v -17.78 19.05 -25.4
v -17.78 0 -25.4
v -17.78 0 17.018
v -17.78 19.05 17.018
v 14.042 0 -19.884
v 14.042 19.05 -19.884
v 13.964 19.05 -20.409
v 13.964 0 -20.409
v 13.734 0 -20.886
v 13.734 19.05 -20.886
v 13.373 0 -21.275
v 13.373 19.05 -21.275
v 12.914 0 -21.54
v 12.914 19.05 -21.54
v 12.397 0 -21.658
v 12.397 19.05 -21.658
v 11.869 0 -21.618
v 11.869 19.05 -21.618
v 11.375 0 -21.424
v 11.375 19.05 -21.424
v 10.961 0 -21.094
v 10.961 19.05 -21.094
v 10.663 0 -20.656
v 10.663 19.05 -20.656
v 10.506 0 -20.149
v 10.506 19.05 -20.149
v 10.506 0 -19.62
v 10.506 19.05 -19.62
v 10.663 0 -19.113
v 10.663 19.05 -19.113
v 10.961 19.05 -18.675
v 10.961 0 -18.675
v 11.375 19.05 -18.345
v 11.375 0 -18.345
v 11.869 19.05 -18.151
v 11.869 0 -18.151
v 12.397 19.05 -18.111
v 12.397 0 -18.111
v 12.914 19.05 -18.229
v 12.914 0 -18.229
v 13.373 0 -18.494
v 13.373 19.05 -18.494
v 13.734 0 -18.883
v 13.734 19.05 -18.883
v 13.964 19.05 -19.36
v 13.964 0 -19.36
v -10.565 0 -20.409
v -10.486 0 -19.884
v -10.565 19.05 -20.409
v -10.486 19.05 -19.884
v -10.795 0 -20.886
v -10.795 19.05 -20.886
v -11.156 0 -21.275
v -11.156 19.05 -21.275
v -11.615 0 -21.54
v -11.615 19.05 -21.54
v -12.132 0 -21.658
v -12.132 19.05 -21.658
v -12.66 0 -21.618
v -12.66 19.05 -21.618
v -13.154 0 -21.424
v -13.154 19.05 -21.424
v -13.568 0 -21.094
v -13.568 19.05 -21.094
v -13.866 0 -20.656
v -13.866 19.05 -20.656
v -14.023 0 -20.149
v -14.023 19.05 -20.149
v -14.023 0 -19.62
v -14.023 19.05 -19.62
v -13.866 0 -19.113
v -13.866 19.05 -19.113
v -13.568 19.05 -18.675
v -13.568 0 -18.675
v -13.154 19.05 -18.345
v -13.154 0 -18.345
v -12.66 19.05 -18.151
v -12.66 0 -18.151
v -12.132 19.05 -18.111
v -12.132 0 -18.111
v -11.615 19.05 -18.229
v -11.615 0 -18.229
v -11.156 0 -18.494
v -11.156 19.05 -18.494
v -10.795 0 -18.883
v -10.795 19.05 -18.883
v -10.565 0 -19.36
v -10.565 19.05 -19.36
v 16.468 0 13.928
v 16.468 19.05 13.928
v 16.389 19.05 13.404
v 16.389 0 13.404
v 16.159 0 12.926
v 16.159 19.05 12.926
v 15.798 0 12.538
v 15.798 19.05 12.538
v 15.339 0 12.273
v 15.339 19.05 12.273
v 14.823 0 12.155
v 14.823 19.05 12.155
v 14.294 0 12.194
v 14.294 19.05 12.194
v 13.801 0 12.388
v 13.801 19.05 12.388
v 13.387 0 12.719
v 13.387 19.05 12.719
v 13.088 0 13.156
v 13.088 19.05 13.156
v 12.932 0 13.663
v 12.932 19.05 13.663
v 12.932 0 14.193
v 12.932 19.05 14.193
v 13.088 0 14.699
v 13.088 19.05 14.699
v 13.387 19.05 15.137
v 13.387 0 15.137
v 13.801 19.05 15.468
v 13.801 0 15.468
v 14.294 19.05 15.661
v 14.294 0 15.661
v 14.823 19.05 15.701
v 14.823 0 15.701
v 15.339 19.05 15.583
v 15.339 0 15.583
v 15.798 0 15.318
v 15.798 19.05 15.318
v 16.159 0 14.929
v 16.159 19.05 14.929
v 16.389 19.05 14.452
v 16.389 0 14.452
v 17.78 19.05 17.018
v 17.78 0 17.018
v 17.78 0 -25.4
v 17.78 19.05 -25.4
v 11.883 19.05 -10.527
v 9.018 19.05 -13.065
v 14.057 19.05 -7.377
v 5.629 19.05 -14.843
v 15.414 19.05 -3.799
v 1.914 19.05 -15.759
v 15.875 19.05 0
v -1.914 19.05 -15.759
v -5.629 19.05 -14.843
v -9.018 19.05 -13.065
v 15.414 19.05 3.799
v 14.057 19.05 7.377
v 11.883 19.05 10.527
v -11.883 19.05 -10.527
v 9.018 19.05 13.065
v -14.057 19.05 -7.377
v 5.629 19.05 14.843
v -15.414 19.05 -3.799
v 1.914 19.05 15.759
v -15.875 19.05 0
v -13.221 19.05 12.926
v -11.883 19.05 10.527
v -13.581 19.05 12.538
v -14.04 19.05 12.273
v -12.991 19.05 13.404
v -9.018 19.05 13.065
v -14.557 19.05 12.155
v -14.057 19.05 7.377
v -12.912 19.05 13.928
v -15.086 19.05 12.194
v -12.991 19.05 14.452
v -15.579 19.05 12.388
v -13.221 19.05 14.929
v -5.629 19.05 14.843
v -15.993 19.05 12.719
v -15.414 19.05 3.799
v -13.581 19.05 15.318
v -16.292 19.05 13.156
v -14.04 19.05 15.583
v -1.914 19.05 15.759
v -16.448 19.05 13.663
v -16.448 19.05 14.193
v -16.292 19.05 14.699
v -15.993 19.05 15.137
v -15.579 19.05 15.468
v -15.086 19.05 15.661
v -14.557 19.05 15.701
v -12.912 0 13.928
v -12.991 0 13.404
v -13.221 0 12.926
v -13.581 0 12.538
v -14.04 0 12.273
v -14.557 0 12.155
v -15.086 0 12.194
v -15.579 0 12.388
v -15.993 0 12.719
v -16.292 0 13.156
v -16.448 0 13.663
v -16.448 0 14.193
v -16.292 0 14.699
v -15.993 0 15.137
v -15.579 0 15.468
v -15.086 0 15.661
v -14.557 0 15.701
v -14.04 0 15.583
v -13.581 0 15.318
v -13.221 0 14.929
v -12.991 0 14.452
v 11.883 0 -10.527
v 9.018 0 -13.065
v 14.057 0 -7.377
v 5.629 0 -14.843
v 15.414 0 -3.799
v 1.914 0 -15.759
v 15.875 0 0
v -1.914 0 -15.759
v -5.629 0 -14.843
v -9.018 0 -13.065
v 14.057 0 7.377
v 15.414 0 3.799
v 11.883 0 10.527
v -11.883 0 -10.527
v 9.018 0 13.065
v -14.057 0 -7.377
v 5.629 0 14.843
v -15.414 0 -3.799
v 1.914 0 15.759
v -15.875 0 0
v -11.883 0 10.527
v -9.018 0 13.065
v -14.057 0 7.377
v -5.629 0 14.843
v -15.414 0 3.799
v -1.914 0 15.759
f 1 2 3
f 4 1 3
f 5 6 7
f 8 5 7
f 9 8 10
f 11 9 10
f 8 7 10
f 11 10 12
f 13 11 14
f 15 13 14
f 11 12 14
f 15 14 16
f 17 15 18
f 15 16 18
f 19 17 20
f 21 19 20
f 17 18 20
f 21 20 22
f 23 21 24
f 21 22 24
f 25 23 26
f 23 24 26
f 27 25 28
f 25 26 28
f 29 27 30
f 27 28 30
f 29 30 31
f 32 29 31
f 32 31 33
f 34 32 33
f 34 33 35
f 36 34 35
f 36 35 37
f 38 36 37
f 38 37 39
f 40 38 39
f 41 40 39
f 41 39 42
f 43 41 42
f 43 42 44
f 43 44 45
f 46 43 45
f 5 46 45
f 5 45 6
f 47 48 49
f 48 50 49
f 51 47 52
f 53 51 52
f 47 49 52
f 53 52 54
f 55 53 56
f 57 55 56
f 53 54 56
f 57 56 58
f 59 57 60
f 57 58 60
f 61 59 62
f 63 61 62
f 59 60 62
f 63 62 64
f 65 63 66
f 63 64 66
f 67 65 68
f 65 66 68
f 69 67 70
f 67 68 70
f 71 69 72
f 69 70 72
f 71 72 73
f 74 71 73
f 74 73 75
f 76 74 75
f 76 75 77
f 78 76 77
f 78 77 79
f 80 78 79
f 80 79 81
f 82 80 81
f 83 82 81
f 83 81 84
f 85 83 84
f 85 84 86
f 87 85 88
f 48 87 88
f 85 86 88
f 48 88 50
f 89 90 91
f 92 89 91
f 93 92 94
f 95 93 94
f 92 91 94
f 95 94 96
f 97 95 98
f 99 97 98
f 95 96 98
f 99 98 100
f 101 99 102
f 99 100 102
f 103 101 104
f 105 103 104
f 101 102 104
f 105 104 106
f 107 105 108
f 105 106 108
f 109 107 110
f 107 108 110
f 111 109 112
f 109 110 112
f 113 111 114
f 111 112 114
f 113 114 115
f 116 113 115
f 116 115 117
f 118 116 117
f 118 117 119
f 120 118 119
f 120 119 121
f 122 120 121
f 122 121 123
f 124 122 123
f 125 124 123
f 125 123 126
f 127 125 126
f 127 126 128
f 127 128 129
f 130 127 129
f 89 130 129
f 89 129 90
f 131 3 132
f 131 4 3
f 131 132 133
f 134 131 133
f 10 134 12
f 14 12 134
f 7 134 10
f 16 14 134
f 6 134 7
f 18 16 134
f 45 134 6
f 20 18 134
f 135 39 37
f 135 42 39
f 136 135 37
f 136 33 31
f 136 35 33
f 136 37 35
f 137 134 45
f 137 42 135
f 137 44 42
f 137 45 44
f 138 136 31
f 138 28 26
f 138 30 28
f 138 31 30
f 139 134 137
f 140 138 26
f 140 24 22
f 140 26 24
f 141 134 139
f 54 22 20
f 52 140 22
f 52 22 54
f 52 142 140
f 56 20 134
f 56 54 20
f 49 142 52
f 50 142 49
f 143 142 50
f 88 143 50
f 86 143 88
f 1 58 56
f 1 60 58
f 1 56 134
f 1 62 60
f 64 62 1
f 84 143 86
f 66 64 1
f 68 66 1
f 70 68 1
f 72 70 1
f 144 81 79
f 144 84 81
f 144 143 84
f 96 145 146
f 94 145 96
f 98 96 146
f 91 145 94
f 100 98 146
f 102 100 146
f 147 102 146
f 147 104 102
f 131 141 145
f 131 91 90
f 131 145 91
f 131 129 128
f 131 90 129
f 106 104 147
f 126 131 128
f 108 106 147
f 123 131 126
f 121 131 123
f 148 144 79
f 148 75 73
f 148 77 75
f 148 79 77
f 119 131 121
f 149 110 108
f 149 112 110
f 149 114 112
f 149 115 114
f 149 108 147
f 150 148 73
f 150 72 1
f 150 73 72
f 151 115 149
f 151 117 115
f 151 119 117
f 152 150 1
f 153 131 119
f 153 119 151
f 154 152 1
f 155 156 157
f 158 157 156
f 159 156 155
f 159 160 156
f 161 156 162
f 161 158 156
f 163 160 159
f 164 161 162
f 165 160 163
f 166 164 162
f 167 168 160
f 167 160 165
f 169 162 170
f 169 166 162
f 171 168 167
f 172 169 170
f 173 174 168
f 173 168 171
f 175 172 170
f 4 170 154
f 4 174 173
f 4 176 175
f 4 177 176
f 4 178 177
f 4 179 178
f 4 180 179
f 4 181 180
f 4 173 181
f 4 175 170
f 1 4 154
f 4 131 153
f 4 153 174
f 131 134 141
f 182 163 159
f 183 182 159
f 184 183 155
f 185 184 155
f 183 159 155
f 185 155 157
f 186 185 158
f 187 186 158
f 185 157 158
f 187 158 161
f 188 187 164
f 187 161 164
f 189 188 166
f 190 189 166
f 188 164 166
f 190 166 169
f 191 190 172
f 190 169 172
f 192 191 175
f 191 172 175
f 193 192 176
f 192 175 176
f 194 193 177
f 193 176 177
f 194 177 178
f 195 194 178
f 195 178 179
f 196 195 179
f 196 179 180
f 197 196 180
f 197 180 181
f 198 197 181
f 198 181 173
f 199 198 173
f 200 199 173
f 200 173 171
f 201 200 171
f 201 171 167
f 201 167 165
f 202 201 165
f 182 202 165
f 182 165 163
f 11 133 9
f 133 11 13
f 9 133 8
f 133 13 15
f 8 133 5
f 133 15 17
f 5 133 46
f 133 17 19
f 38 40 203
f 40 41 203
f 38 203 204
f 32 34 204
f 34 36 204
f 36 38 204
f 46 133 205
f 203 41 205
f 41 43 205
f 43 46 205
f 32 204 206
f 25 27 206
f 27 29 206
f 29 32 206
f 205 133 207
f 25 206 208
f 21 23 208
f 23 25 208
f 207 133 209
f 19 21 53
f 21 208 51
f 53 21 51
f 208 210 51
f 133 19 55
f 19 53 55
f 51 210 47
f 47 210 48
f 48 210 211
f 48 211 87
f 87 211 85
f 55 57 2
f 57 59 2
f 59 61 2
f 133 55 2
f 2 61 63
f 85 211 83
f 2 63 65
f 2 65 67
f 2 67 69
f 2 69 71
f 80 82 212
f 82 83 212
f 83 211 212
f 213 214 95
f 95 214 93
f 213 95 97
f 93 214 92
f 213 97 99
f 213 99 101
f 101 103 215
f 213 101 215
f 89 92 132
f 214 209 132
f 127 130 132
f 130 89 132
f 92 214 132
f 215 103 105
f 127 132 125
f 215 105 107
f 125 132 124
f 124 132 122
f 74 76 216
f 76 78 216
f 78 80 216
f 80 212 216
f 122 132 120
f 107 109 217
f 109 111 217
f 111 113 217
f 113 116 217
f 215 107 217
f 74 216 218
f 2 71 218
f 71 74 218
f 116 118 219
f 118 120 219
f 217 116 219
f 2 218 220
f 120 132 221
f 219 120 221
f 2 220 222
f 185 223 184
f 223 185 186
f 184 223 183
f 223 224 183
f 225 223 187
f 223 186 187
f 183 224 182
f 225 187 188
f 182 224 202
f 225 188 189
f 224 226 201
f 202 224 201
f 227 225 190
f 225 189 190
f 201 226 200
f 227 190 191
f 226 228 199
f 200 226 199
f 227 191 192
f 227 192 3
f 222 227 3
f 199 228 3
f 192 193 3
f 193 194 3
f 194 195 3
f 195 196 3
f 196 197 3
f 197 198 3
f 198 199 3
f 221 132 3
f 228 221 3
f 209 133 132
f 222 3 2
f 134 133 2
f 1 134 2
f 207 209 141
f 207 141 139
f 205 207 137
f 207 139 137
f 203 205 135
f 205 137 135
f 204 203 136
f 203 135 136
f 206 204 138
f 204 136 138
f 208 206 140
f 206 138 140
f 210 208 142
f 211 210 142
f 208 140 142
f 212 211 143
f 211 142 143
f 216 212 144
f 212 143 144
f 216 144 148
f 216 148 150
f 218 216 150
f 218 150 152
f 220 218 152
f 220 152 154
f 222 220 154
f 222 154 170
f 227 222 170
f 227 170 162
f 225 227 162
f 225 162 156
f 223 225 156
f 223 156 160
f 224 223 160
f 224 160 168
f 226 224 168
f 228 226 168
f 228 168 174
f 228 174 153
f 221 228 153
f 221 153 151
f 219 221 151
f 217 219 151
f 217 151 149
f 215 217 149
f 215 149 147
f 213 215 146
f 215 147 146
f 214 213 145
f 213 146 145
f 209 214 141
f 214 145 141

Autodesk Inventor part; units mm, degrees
ref_plane "YZ Plane" through (0, 0, 0) normal (1, 0, 0) x (0, 1, 0)
ref_plane "XZ Plane" through (0, 0, 0) normal (0, 1, 0) x (-1, 0, 0)
ref_plane "XY Plane" through (0, 0, 0) normal (0, 0, 1) x (1, 0, 0)
sketch "Sketch3" plane through (0, 0, 0) normal (0, 1, 0) x (-1, 0, 0)
  line L0 (-17.78, -25.4) -> (17.78, -25.4)
  line L1 (17.78, -25.4) -> (17.78, 25.4)
  line L2 (17.78, 25.4) -> (-17.78, 25.4)
  line L3 (-17.78, 25.4) -> (-17.78, -25.4)
  line L4 (-17.78, -25.4) -> (17.78, 25.4) construction
  line L5 (17.78, -25.4) -> (-17.78, 25.4) construction
  point P0 (0, 0)
  dimension "d11" = 35.56
  dimension "d12" = 50.8
extrude "Extrusion3" add sketch "Sketch3" along normal blind 19.05
sketch "Sketch4" plane through (0, 19.05, 0) normal (0, 1, 0) x (1, 0, 0)
  circle A0 centre (0, 0) radius 15.875
  dimension "d15" = 31.75
extrude "Extrusion4" cut sketch "Sketch4" against normal blind 19.05
sketch "Sketch5" plane through (0, 19.05, 0) normal (0, 1, 0) x (1, 0, 0)
  line L0 (-17.6835, 25.5364) -> (55.9847, 25.5364) construction
  line L1 (-17.78, -25.4) -> (33.02, -25.4) construction
  circle A0 centre (12.2645, 19.8845) radius 1.778
  circle A1 centre (-12.2645, 19.8845) radius 1.778
  circle A2 centre (-12.2645, -19.8845) radius 1.778
  circle A3 centre (12.2645, -19.8845) radius 1.778
  point P0 (0, 0)
  point P1 (-17.78, 25.4)
  point P2 (17.78, -25.4)
  point P3 (17.78, 25.4)
  point P4 (0, 0)
  dimension "d20" = 3.556
  dimension "d21" = 3.556
  dimension "d22" = 3.556
  dimension "d23" = 3.556
extrude "Extrusion5" cut sketch "Sketch5" against normal blind 19.05
sketch "Sketch6" plane through (0, 19.05, 0) normal (0, 1, 0) x (1, 0, 0)
  line L0 (-17.78, -17.018) -> (17.78, -17.018)
  line L1 (-17.78, -17.018) -> (-17.78, -25.4)
  line L2 (-17.78, -25.4) -> (17.78, -25.4) projected
  line L3 (17.78, -25.4) -> (17.78, -17.018)
  point P0 (0, 0)
  point P1 (17.78, 25.4)
  point P2 (-17.78, 25.4)
  dimension "d26" = 42.418
extrude "Extrusion6" cut sketch "Sketch6" against normal blind 19.05
sketch "Sketch7" plane through (0, 19.05, 0) normal (0, 1, 0) x (1, 0, 0)
  circle A0 centre (-14.6899, -13.9279) radius 1.778
  circle A1 centre (14.6899, -13.9279) radius 1.778
  point P0 (0, 0)
  point P1 (-17.78, -17.018)
  dimension "d30" = 3.556
  dimension "d31" = 3.556
extrude "Extrusion7" cut sketch "Sketch7" against normal blind 19.05
properties part number "DPLX_P020_Camera Shroud Base_RevB"
